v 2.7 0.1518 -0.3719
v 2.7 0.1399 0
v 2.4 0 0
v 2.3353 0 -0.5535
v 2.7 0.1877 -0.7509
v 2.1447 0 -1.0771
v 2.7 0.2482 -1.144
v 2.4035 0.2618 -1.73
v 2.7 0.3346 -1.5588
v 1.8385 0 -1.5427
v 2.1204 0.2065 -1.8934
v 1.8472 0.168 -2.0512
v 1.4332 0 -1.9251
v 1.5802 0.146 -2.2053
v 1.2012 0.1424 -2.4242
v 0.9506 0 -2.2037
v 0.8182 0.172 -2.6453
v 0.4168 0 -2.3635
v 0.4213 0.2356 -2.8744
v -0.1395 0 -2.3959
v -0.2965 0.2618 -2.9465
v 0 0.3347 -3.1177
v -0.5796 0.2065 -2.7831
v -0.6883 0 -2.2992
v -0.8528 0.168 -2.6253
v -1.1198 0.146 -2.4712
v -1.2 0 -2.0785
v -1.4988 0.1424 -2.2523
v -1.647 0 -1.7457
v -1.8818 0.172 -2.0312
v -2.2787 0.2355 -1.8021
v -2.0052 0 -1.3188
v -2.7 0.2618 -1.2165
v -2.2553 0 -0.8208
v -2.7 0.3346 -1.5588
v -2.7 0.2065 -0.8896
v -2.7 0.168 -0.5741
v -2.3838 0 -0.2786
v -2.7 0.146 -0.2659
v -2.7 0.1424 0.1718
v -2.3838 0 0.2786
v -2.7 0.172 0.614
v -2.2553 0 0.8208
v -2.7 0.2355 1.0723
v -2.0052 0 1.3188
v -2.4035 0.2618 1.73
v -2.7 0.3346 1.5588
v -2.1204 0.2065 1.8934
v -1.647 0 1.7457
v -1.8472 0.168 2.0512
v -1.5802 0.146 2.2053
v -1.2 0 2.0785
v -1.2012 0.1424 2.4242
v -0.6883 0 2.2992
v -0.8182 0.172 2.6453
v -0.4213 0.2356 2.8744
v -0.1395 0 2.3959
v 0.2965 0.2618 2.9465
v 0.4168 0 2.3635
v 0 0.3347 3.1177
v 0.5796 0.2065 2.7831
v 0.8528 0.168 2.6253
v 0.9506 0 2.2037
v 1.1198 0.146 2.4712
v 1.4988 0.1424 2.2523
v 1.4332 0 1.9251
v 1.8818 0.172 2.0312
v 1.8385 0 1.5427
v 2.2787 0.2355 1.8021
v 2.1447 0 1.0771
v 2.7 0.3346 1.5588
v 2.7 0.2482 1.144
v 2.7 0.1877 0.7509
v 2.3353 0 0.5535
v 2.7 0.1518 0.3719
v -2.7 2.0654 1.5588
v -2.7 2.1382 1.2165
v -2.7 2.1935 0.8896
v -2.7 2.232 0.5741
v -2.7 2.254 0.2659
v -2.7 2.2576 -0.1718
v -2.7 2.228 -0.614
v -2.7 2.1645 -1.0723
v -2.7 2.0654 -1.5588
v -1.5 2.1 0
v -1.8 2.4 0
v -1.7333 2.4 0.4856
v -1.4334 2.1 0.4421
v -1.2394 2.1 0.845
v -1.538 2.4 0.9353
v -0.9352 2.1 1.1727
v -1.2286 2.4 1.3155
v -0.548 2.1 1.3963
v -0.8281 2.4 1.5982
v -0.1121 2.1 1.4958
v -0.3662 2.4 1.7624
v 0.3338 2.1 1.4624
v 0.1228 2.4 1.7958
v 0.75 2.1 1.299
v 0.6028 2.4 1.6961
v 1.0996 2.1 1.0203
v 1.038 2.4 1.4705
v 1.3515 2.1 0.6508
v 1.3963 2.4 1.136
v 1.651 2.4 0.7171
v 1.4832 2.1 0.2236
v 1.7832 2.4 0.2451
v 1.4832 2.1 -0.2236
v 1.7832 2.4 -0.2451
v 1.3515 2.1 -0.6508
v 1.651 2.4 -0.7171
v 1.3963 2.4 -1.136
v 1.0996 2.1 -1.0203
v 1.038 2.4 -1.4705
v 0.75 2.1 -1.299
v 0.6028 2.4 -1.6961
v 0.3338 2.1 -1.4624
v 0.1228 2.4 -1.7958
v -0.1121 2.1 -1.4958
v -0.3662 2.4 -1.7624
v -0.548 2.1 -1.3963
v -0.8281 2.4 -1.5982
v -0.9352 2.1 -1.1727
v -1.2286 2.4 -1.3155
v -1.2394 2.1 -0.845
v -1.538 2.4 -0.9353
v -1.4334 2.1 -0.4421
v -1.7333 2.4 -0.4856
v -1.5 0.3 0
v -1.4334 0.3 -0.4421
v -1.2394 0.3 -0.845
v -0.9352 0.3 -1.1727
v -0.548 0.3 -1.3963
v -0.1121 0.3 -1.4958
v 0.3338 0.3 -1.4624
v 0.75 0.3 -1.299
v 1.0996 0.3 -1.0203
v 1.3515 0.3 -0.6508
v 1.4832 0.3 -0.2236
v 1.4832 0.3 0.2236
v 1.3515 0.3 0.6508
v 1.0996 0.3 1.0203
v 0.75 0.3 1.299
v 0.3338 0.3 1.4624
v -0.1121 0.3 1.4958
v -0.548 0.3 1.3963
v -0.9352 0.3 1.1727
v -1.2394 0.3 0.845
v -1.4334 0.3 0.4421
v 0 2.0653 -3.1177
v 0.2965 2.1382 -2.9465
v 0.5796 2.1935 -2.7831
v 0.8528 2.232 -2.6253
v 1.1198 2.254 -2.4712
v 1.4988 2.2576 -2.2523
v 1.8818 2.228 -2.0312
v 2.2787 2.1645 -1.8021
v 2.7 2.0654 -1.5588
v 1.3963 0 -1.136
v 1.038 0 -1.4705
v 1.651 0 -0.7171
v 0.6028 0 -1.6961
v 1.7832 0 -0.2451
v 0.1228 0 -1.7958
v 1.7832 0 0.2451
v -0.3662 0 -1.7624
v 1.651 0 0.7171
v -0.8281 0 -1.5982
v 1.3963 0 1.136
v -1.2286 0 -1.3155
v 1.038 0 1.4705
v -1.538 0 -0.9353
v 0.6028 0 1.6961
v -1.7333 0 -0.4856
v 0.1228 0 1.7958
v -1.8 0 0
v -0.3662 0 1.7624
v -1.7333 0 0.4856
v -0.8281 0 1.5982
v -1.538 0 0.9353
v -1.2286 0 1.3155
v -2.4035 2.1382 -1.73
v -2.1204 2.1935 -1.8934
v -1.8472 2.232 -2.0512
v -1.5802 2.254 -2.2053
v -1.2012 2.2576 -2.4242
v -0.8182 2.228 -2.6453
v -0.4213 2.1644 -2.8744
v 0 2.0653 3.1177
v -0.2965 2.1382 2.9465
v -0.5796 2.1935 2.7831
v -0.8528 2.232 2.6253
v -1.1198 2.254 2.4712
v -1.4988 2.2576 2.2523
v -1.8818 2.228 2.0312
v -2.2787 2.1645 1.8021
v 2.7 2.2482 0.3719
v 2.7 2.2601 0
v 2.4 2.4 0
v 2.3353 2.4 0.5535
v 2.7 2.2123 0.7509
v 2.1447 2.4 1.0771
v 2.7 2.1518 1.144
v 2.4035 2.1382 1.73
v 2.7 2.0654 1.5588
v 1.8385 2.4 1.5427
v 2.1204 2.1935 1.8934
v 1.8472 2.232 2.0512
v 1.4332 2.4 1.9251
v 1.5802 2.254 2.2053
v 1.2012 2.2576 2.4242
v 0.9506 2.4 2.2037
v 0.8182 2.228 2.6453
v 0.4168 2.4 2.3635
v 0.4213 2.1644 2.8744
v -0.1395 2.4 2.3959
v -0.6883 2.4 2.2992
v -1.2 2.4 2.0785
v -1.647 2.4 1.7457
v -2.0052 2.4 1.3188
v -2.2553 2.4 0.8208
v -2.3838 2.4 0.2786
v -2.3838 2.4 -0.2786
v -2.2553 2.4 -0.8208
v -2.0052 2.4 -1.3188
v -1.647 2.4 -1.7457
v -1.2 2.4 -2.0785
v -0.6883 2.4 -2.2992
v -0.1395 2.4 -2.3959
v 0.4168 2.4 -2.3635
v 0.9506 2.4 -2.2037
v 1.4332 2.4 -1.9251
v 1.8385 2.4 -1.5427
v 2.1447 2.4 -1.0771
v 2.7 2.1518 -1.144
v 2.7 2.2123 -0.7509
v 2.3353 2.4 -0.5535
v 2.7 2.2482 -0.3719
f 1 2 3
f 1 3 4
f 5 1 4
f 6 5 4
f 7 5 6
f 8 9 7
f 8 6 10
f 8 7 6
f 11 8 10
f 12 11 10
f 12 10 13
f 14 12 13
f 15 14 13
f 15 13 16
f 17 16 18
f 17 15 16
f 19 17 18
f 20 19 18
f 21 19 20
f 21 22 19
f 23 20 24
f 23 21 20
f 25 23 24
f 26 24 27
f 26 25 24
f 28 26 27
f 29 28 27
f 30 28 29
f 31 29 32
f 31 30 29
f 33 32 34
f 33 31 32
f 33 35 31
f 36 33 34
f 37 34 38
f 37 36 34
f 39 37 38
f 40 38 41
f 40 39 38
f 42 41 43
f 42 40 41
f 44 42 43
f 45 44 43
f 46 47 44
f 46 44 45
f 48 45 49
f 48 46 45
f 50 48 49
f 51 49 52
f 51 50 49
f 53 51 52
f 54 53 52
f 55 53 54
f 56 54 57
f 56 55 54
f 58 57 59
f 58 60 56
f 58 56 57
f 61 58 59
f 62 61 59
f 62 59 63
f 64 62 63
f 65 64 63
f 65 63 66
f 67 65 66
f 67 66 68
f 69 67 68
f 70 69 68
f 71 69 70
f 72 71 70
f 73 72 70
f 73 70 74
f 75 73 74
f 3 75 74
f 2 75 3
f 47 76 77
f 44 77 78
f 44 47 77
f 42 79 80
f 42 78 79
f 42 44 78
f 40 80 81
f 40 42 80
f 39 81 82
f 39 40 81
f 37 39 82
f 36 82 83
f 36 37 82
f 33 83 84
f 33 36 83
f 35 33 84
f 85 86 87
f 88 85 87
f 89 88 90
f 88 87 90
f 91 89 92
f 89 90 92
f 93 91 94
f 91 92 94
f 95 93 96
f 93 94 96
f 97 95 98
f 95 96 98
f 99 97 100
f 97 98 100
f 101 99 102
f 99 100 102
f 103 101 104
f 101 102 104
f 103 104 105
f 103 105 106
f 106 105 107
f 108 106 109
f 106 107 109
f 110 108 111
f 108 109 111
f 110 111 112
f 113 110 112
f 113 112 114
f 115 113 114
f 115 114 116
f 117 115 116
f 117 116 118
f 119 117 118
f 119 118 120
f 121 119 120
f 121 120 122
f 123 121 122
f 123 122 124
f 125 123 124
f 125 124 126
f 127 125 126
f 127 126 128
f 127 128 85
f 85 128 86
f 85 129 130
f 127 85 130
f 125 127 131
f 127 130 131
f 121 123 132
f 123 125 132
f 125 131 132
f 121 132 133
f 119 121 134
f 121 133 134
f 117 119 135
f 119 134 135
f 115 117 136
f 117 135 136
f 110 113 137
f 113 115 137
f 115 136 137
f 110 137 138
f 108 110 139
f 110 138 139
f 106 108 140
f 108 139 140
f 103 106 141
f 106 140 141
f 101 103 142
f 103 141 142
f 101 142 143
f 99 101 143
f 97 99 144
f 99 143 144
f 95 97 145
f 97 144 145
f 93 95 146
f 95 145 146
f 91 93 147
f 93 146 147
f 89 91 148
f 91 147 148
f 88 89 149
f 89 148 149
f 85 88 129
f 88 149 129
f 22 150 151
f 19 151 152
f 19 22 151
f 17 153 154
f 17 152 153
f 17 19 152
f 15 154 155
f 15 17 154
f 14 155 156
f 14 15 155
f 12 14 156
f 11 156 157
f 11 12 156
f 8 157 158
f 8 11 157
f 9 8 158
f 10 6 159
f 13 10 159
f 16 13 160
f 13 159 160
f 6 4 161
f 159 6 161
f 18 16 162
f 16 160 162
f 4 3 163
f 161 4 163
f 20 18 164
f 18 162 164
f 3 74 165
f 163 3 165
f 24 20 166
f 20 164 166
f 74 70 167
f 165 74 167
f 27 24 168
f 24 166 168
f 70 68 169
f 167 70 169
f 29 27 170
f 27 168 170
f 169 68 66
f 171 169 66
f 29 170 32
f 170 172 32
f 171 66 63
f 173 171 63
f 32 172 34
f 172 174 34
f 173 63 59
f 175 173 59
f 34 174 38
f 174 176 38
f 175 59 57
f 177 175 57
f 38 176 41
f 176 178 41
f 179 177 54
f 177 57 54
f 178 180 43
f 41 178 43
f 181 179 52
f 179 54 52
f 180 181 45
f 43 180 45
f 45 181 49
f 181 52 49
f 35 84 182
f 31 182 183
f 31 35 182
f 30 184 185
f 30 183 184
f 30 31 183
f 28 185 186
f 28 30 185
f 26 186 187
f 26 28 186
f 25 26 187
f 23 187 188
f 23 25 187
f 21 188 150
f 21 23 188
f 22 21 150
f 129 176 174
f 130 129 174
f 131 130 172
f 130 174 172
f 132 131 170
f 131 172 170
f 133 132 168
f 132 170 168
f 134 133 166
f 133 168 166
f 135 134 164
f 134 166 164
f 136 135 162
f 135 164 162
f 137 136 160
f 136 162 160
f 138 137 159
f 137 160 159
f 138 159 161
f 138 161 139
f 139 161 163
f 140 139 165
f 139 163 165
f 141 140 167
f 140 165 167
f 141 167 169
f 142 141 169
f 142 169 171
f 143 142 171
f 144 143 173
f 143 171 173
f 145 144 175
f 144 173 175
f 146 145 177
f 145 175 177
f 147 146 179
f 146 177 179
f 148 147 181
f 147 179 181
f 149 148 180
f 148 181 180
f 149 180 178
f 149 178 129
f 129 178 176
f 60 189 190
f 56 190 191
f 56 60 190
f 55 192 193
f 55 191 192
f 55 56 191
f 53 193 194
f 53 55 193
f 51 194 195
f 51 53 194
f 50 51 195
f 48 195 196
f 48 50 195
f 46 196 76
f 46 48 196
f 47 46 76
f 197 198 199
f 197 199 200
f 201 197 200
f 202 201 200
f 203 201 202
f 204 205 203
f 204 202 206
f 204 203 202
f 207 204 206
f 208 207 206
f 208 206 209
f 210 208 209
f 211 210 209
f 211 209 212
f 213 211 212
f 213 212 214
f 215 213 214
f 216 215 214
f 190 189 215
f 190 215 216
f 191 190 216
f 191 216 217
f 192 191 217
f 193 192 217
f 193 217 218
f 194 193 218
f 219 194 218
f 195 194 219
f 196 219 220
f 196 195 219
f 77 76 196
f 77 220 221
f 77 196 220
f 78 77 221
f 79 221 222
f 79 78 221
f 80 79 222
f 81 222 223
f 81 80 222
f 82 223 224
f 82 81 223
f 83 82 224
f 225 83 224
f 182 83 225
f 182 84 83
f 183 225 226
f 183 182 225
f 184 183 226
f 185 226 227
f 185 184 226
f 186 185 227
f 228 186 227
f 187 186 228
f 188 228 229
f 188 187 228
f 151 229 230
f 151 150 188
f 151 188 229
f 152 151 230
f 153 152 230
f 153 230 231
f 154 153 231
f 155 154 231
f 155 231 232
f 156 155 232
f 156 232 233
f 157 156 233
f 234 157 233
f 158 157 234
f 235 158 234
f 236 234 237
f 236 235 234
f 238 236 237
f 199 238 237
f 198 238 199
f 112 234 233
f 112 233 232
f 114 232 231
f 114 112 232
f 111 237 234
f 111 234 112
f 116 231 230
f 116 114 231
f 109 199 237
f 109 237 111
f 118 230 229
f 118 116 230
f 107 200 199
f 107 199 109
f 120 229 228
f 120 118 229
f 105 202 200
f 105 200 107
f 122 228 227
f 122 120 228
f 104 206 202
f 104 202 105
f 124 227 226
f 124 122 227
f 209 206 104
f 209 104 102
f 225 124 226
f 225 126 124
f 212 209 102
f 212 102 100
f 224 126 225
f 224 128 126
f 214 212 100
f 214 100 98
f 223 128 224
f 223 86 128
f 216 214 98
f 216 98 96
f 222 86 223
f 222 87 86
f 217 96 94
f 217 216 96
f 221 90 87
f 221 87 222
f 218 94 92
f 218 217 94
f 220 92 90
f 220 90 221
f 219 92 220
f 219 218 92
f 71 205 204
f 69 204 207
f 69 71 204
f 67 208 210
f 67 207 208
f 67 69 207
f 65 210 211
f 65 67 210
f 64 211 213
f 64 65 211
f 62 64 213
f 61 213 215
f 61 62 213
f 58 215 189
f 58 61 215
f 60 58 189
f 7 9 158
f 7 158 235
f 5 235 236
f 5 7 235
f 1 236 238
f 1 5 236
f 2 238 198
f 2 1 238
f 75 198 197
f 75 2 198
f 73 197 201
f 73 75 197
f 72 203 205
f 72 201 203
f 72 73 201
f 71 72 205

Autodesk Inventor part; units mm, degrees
ref_plane "YZ Plane" through (0, 0, 0) normal (1, 0, 0) x (0, 1, 0)
ref_plane "XZ Plane" through (0, 0, 0) normal (0, 1, 0) x (-1, 0, 0)
ref_plane "XY Plane" through (0, 0, 0) normal (0, 0, 1) x (1, 0, 0)
sketch "Esboço2" plane through (0, 0, 0) normal (0, 1, 0) x (-1, 0, 0)
  circle A0 centre (0, 0) radius 1.5
  line L0 (2.7, -1.5588) -> (0, -3.1177)
  line L1 (0, -3.1177) -> (-2.7, -1.5588)
  line L2 (-2.7, -1.5588) -> (-2.7, 1.5588)
  line L3 (-2.7, 1.5588) -> (0, 3.1177)
  line L4 (0, 3.1177) -> (2.7, 1.5588)
  line L5 (2.7, 1.5588) -> (2.7, -1.5588)
extrude "Extrusão1" add sketch "Esboço2" along normal blind 2.4
thread "Rosca1" size "M3x0.5" class "6H" standard "ANSI Metric M Profile" full length
chamfer "Chanfro1" distance 0.3 angle 45 2 edges at (1.5, 2.4, 0) (1.5, 0, 0)
sketch "Esboço3" plane through (0, 0, 0) normal (0, 0, 1) x (1, 0, 0)
  line L0 (0, -0.6576) -> (0, 3.9457) projected
  line L1 (2.4, 2.4) -> (4.5158, 1.4134)
  line L2 (2.4, 2.4) -> (4.7345, 2.4) construction
  line L3 (2.4, 0) -> (4.5158, 0.9866)
  line L4 (2.4, 2.4) -> (4.5158, 2.4)
  line L5 (2.4, 0) -> (4.5158, 0.9866)
  line L6 (2.4, 2.4) -> (4.5158, 1.4134)
  line L7 (4.5158, 1.4134) -> (4.5158, 2.4)
  line L8 (4.5158, 0.9866) -> (4.5158, 0)
  line L9 (4.5158, 0.9866) -> (2.4, 0)
  line L10 (2.4, 0) -> (4.5158, 0)
  line L11 (2.7, 0) -> (0, 0) projected
  dimension "d16" = 25
revolve "Revolução2" cut sketch "Esboço3" angle 360 about axis through (0, -10, 0) along (0, 1, 0)
properties part number "porca m3" material "Aço galvanizado"
